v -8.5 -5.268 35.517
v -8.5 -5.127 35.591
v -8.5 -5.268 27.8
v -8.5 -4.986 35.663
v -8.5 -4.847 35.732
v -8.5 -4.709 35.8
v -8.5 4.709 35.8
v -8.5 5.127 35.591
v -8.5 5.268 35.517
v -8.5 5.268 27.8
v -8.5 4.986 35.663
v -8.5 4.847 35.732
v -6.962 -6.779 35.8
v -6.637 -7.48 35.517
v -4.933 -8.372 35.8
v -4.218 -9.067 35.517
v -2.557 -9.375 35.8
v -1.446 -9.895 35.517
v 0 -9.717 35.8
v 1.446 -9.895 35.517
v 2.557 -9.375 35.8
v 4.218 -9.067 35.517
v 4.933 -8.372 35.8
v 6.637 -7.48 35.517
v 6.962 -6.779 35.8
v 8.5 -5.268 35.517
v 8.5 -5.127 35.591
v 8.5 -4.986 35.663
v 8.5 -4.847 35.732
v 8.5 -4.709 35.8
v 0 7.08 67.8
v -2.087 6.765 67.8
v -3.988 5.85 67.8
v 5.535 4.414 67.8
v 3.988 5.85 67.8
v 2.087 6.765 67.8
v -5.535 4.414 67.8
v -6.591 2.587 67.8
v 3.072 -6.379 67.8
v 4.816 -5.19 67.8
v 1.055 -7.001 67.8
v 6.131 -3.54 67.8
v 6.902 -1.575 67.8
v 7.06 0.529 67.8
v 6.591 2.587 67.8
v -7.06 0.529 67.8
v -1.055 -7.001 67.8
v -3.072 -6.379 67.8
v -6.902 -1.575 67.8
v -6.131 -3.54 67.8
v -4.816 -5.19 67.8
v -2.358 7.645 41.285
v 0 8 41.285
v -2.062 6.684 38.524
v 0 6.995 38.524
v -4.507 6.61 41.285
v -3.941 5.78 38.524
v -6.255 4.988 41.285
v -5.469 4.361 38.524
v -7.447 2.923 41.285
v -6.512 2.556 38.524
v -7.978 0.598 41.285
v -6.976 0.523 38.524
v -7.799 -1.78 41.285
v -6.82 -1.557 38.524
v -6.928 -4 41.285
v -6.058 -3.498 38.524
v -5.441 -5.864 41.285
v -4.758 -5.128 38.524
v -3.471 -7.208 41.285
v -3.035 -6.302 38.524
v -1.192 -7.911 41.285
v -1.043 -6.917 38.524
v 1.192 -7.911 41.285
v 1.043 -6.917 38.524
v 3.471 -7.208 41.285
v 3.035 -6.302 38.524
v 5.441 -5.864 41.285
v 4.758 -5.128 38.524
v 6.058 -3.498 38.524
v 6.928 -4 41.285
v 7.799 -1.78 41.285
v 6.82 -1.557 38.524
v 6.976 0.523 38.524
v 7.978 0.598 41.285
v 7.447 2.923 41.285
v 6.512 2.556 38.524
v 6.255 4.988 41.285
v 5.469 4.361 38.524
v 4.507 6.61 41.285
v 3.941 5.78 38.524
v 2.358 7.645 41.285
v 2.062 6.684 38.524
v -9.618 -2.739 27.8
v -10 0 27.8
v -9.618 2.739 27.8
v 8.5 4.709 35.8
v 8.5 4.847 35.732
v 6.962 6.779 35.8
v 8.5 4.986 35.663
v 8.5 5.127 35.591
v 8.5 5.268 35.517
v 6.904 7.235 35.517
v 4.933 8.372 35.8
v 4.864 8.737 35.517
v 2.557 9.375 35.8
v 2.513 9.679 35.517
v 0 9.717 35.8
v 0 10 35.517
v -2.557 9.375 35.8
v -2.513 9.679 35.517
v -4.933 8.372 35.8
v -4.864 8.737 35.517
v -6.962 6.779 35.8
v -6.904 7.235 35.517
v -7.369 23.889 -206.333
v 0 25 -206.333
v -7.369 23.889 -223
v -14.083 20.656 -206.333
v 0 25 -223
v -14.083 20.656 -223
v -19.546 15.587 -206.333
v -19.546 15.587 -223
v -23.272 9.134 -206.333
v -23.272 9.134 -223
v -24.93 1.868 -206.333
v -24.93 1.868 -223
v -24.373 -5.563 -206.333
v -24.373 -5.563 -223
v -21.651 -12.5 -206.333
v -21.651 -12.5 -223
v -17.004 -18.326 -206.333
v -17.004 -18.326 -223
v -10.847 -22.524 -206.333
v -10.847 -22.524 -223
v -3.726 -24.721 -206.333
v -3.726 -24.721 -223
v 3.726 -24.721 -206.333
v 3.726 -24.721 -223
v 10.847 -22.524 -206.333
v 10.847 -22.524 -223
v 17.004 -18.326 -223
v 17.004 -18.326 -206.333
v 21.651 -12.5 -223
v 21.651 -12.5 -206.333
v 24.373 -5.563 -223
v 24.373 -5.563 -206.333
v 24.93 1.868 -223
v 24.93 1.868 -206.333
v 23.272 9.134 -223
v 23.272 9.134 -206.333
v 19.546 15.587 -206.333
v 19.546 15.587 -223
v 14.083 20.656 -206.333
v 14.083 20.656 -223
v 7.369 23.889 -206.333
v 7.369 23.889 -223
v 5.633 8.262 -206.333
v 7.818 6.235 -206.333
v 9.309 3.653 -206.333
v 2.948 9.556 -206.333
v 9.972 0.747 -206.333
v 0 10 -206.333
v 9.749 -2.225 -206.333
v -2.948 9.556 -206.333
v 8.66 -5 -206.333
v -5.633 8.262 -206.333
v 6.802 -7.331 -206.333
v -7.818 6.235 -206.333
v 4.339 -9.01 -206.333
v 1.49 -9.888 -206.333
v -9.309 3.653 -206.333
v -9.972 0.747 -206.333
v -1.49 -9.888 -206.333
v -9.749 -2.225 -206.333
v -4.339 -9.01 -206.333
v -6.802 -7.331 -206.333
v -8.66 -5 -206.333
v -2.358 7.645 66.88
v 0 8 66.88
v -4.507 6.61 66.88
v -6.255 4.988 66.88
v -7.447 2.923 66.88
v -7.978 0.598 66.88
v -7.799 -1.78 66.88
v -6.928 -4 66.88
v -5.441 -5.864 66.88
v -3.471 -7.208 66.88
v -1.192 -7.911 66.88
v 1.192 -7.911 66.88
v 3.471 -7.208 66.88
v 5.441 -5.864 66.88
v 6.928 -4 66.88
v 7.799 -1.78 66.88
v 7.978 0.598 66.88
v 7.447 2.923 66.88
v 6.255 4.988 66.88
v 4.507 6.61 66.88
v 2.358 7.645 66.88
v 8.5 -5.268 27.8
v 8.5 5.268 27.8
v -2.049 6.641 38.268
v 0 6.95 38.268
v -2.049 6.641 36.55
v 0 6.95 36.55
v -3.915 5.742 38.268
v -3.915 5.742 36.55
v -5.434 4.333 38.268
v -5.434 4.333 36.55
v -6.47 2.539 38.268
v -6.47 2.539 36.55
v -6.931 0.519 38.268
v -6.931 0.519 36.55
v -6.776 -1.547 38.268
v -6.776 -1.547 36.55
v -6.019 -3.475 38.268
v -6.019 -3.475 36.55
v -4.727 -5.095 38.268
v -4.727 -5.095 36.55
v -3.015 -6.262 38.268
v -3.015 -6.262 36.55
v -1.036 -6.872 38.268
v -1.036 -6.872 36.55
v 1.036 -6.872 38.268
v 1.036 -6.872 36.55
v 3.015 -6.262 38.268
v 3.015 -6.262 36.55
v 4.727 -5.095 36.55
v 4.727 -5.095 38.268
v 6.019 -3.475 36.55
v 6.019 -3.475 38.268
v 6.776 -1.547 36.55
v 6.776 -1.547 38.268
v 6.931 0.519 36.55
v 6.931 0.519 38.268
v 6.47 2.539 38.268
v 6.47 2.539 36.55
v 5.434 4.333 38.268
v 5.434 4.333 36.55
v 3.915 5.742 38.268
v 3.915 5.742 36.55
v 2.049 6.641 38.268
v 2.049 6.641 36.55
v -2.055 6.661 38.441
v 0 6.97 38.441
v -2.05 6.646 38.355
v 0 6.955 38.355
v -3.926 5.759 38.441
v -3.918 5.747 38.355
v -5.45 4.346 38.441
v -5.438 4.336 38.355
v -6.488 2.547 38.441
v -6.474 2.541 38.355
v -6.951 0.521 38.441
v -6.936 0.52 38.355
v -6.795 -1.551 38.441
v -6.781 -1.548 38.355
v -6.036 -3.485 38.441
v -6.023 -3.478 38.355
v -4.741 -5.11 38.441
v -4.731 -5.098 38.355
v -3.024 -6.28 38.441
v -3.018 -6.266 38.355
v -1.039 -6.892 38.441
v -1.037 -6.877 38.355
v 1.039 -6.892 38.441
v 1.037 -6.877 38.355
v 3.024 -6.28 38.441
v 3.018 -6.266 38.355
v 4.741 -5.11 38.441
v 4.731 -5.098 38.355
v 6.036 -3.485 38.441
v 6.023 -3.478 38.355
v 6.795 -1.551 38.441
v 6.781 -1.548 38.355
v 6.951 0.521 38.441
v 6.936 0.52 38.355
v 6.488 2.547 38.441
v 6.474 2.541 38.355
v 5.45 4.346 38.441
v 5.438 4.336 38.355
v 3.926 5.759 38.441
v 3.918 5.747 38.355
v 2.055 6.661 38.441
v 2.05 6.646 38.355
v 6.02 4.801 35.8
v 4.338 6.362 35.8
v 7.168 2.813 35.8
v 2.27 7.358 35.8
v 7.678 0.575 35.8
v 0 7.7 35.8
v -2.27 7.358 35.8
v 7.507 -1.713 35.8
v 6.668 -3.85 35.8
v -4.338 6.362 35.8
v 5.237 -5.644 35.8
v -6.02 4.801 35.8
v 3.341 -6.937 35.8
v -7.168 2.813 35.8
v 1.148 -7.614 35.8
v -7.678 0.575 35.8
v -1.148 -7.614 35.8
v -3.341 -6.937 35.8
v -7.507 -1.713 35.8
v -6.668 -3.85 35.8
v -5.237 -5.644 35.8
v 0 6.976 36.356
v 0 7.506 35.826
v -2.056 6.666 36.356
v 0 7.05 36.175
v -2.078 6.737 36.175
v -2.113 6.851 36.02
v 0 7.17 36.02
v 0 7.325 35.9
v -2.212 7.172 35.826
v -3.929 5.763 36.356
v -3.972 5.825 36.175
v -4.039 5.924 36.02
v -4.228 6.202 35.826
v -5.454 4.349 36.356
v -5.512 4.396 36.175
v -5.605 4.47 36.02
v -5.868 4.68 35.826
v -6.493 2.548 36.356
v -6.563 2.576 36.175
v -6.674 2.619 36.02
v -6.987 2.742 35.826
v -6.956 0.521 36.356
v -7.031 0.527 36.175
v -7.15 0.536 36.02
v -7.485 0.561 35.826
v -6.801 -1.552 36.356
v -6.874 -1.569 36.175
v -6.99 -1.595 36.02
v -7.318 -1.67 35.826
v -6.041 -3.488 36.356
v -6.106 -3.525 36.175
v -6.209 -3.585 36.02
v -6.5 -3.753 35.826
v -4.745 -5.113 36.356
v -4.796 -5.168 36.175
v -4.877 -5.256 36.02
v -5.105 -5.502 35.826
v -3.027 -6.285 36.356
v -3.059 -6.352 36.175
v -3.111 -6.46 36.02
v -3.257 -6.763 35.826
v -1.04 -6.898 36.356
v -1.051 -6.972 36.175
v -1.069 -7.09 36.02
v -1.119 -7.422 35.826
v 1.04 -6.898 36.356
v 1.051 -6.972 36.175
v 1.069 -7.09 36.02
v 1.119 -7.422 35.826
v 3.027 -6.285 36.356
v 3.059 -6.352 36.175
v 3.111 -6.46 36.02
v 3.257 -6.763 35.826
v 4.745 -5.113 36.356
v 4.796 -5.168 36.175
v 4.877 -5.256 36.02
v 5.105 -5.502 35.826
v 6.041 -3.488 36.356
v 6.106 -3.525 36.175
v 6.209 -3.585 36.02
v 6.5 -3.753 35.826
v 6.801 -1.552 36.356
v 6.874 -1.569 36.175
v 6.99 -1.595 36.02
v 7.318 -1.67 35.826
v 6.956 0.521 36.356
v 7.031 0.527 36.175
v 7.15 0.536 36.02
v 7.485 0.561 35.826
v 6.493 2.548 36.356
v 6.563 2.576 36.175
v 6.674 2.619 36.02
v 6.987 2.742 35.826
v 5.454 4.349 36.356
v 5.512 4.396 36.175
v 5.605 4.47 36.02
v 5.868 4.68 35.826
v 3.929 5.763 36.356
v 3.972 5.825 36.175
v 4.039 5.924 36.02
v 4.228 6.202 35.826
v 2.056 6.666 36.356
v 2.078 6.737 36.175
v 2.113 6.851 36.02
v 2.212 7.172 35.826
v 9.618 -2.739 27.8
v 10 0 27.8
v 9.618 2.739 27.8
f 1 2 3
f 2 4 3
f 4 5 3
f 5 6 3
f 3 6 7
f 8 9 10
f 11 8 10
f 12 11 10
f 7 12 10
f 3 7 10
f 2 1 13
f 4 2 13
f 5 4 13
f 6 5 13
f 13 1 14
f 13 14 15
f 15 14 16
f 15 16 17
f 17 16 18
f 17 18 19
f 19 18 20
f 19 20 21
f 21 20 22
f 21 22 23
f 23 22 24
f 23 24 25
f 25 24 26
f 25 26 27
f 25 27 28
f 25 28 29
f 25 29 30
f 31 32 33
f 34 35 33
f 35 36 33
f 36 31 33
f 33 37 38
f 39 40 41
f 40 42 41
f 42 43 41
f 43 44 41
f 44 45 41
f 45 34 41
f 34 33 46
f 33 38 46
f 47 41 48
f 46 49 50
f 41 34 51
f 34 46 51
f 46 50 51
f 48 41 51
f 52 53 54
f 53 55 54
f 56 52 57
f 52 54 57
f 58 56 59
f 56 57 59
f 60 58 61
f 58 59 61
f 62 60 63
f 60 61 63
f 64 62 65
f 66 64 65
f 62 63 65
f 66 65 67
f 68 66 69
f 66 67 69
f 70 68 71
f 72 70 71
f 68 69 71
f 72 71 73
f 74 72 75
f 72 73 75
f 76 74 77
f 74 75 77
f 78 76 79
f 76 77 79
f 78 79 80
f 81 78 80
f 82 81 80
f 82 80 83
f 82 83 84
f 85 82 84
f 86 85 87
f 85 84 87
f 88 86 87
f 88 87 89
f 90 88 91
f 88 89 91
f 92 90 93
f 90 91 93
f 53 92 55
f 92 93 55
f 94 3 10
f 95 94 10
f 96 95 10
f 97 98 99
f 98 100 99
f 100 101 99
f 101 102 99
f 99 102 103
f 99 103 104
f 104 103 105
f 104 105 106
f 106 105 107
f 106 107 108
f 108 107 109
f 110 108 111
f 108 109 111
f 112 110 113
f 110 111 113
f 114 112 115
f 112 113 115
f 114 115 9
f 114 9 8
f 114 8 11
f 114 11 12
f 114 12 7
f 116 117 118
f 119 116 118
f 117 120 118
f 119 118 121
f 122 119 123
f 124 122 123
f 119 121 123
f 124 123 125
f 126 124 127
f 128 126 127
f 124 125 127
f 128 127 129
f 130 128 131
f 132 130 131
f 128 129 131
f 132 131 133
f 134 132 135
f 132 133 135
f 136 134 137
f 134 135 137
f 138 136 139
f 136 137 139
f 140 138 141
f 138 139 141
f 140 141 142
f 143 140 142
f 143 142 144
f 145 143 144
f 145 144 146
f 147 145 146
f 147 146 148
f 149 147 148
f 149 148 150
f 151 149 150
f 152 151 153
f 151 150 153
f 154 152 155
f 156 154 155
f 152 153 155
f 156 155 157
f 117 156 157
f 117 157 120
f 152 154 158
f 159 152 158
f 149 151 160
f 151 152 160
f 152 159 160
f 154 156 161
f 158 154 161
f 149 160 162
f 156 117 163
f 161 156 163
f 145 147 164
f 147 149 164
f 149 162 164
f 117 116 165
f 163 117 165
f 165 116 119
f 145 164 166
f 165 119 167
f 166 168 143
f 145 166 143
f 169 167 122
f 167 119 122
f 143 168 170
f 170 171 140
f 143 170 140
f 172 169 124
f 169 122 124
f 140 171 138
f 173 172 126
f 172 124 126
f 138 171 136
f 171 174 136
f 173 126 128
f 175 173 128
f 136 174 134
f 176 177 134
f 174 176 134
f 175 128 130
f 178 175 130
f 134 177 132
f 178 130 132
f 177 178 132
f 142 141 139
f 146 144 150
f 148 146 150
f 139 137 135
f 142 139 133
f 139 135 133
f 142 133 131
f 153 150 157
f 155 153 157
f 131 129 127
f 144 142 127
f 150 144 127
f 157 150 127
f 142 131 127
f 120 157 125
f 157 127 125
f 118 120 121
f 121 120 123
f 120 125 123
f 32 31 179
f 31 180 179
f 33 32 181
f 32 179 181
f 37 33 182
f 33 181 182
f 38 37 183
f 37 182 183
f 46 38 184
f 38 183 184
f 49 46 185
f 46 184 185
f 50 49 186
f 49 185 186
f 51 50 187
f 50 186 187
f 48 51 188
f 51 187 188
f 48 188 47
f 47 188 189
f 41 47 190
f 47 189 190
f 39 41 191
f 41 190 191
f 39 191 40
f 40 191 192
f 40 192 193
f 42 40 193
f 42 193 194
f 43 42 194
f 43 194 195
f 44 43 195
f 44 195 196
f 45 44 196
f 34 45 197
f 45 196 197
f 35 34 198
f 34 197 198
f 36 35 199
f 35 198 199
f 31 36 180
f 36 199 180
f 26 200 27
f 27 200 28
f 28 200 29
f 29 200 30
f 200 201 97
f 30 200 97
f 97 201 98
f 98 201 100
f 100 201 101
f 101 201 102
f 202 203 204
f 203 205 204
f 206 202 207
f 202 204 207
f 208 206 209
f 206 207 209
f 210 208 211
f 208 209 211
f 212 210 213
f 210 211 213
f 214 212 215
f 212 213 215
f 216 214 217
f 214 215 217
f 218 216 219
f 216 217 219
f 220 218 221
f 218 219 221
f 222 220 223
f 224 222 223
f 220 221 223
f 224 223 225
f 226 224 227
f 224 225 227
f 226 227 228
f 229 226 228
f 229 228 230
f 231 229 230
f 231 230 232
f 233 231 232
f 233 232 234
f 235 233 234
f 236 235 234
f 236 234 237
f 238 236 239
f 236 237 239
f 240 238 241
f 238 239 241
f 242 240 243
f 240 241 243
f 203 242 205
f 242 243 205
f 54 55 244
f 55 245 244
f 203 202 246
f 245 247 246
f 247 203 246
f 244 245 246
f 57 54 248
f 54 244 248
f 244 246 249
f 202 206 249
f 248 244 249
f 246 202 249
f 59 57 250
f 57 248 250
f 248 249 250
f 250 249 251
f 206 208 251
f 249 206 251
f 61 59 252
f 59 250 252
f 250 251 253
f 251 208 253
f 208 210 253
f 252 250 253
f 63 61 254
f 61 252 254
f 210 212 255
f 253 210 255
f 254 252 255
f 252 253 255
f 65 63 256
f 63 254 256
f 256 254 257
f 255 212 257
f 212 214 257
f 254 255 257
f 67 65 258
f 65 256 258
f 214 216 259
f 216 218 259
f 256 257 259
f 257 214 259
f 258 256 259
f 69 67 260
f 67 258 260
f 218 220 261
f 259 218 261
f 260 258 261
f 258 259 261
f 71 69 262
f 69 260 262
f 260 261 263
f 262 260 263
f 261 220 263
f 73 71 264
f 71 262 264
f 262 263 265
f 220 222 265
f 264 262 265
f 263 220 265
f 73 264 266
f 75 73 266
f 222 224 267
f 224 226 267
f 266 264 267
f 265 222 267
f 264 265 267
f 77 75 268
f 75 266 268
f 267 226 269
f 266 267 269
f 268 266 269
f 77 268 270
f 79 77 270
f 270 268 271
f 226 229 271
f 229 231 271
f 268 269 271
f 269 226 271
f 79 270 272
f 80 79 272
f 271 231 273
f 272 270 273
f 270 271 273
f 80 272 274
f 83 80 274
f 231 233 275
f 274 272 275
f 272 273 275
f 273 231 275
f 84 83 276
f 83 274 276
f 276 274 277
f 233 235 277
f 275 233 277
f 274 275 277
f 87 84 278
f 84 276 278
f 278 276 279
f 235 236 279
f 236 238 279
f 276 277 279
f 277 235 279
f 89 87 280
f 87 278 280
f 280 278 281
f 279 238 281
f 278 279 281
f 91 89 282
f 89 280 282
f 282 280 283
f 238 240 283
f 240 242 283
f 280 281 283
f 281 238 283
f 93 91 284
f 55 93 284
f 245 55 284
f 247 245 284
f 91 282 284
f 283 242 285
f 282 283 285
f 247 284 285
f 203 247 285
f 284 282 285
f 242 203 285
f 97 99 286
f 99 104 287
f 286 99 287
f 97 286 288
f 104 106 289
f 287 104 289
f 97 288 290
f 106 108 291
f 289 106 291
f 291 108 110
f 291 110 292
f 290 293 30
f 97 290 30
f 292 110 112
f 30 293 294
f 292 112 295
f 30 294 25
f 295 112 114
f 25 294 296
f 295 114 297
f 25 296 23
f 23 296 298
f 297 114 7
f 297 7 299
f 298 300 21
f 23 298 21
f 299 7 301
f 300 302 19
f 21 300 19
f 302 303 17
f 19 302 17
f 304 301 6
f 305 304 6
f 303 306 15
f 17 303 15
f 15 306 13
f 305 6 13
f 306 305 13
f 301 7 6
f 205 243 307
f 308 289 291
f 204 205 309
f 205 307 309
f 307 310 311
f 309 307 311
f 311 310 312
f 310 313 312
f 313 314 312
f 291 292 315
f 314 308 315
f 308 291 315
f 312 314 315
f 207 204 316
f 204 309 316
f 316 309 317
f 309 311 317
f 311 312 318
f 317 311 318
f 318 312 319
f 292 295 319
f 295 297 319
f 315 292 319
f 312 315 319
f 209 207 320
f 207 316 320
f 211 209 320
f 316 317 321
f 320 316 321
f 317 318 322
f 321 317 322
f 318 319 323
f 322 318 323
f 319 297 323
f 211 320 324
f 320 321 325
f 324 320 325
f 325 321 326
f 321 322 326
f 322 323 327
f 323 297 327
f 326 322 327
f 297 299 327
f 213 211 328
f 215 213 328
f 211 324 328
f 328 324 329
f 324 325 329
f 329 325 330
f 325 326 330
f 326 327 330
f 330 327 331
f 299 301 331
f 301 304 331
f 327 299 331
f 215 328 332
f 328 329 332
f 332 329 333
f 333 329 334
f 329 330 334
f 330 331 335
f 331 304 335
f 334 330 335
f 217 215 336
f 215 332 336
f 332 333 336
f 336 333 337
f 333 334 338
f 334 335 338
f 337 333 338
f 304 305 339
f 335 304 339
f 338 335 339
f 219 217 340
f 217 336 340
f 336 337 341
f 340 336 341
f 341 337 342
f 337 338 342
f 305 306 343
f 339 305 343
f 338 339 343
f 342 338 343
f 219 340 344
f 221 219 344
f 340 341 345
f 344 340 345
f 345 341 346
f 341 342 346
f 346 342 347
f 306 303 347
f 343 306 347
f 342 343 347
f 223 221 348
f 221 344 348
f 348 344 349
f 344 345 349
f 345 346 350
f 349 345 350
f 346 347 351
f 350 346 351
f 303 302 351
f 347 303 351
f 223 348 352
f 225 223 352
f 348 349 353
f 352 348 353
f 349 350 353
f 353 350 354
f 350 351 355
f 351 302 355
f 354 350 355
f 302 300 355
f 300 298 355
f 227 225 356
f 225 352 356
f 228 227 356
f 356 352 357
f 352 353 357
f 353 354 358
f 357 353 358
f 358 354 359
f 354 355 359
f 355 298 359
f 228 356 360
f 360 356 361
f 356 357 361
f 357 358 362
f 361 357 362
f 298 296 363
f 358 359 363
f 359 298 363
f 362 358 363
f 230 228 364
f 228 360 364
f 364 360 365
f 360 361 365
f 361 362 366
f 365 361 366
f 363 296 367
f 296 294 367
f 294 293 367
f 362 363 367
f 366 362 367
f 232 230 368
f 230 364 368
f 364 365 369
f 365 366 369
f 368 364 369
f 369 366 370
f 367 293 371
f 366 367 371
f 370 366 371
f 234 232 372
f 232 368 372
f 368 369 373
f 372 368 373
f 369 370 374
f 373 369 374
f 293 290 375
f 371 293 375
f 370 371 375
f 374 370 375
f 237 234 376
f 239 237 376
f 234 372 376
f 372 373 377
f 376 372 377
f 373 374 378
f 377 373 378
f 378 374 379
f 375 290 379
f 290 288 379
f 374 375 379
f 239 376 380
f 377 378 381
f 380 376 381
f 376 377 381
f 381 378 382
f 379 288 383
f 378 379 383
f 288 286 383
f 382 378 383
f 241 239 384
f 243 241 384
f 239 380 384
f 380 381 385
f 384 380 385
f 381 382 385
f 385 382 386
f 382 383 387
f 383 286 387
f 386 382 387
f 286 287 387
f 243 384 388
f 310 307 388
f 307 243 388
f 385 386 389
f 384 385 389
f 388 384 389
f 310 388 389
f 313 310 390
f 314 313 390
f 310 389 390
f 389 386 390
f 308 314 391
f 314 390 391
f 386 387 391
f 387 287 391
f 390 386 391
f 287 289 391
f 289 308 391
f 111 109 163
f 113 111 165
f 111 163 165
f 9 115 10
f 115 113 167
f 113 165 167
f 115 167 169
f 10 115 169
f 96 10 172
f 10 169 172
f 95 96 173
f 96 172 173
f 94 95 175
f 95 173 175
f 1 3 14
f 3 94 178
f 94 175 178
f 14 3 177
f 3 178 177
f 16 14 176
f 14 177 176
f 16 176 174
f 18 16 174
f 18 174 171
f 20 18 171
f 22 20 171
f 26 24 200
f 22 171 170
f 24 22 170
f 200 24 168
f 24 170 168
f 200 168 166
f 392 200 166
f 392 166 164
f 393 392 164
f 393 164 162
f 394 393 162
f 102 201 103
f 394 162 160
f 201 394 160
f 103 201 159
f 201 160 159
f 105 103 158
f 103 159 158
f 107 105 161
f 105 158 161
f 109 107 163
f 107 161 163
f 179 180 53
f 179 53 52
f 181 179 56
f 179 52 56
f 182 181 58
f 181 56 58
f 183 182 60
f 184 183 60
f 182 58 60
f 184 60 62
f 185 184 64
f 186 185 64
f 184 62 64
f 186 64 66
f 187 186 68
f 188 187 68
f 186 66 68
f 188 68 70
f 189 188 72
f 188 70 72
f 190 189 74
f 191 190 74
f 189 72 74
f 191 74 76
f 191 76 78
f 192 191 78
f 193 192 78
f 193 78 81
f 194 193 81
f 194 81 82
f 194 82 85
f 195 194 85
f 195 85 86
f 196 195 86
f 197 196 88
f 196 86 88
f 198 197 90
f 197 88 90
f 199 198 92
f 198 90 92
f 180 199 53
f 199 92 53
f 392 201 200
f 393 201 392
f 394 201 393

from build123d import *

# Parameters (mm, degrees)
CUT_EXTRUDE1_DEPTH      = 17
CUT_EXTRUDE1_DEPTH_BACK = 17


with BuildPart() as part:
    # Sketch1 → Revolve1 (revolve)
    with BuildSketch(Plane(origin=(0, 0, 0), x_dir=(0, 0, -1), z_dir=(1, 0, 0))):
        Polygon((-35.8, 0), (-35.8, 9.717157288), (-35.517157288, 10), (206.333333333, 10), (206.333333333, 25), (223, 25), (223, 0), align=None)
    revolve(axis=Axis((0, 0, -223), (0, 0, 1)))

    # Sketch2 → Cut-Extrude1 (cut, two sides: drawn at the far end of the back side and taken through both)
    with BuildSketch(Plane(origin=(0, 0, 0), x_dir=(1, 0, 0), z_dir=(0, 1, 0)).offset(-CUT_EXTRUDE1_DEPTH_BACK)):
        Polygon((-17, -61.8), (17, -61.8), (17, -27.8), (8.5, -27.8), (8.5, -43.8), (-8.5, -43.8), (-8.5, -27.8), (-17, -27.8), align=None)
    extrude(amount=CUT_EXTRUDE1_DEPTH + CUT_EXTRUDE1_DEPTH_BACK, mode=Mode.SUBTRACT)

    # Sketch3 → Revolve2 (revolve)
    with BuildSketch(Plane(origin=(0, 0, 0), x_dir=(0, 0, -1), z_dir=(1, 0, 0))):
        with BuildLine():
            Line((-67.8, 0), (-67.8, 7.08))
            Line((-67.8, 7.08), (-66.88, 8))
            Line((-66.88, 8), (-41.28485129, 8))
            Line((-41.28485129, 8), (-38.524269872, 6.995230534))
            ThreePointArc((-38.524269872, 6.995230534), (-38.397990898, 6.961394185), (-38.267754764, 6.95))
            Line((-38.267754764, 6.95), (-36.55, 6.95))
            ThreePointArc((-36.55, 6.95), (-36.019669914, 7.169669914), (-35.8, 7.7))
            Line((-35.8, 7.7), (-35.05, 7.7))
            Line((-35.05, 7.7), (-35.05, 0))
            Line((-35.05, 0), (-67.8, 0))
        make_face()
    revolve(axis=Axis((0, 0, 35.05), (0, 0, 1)))


solid = part.part
